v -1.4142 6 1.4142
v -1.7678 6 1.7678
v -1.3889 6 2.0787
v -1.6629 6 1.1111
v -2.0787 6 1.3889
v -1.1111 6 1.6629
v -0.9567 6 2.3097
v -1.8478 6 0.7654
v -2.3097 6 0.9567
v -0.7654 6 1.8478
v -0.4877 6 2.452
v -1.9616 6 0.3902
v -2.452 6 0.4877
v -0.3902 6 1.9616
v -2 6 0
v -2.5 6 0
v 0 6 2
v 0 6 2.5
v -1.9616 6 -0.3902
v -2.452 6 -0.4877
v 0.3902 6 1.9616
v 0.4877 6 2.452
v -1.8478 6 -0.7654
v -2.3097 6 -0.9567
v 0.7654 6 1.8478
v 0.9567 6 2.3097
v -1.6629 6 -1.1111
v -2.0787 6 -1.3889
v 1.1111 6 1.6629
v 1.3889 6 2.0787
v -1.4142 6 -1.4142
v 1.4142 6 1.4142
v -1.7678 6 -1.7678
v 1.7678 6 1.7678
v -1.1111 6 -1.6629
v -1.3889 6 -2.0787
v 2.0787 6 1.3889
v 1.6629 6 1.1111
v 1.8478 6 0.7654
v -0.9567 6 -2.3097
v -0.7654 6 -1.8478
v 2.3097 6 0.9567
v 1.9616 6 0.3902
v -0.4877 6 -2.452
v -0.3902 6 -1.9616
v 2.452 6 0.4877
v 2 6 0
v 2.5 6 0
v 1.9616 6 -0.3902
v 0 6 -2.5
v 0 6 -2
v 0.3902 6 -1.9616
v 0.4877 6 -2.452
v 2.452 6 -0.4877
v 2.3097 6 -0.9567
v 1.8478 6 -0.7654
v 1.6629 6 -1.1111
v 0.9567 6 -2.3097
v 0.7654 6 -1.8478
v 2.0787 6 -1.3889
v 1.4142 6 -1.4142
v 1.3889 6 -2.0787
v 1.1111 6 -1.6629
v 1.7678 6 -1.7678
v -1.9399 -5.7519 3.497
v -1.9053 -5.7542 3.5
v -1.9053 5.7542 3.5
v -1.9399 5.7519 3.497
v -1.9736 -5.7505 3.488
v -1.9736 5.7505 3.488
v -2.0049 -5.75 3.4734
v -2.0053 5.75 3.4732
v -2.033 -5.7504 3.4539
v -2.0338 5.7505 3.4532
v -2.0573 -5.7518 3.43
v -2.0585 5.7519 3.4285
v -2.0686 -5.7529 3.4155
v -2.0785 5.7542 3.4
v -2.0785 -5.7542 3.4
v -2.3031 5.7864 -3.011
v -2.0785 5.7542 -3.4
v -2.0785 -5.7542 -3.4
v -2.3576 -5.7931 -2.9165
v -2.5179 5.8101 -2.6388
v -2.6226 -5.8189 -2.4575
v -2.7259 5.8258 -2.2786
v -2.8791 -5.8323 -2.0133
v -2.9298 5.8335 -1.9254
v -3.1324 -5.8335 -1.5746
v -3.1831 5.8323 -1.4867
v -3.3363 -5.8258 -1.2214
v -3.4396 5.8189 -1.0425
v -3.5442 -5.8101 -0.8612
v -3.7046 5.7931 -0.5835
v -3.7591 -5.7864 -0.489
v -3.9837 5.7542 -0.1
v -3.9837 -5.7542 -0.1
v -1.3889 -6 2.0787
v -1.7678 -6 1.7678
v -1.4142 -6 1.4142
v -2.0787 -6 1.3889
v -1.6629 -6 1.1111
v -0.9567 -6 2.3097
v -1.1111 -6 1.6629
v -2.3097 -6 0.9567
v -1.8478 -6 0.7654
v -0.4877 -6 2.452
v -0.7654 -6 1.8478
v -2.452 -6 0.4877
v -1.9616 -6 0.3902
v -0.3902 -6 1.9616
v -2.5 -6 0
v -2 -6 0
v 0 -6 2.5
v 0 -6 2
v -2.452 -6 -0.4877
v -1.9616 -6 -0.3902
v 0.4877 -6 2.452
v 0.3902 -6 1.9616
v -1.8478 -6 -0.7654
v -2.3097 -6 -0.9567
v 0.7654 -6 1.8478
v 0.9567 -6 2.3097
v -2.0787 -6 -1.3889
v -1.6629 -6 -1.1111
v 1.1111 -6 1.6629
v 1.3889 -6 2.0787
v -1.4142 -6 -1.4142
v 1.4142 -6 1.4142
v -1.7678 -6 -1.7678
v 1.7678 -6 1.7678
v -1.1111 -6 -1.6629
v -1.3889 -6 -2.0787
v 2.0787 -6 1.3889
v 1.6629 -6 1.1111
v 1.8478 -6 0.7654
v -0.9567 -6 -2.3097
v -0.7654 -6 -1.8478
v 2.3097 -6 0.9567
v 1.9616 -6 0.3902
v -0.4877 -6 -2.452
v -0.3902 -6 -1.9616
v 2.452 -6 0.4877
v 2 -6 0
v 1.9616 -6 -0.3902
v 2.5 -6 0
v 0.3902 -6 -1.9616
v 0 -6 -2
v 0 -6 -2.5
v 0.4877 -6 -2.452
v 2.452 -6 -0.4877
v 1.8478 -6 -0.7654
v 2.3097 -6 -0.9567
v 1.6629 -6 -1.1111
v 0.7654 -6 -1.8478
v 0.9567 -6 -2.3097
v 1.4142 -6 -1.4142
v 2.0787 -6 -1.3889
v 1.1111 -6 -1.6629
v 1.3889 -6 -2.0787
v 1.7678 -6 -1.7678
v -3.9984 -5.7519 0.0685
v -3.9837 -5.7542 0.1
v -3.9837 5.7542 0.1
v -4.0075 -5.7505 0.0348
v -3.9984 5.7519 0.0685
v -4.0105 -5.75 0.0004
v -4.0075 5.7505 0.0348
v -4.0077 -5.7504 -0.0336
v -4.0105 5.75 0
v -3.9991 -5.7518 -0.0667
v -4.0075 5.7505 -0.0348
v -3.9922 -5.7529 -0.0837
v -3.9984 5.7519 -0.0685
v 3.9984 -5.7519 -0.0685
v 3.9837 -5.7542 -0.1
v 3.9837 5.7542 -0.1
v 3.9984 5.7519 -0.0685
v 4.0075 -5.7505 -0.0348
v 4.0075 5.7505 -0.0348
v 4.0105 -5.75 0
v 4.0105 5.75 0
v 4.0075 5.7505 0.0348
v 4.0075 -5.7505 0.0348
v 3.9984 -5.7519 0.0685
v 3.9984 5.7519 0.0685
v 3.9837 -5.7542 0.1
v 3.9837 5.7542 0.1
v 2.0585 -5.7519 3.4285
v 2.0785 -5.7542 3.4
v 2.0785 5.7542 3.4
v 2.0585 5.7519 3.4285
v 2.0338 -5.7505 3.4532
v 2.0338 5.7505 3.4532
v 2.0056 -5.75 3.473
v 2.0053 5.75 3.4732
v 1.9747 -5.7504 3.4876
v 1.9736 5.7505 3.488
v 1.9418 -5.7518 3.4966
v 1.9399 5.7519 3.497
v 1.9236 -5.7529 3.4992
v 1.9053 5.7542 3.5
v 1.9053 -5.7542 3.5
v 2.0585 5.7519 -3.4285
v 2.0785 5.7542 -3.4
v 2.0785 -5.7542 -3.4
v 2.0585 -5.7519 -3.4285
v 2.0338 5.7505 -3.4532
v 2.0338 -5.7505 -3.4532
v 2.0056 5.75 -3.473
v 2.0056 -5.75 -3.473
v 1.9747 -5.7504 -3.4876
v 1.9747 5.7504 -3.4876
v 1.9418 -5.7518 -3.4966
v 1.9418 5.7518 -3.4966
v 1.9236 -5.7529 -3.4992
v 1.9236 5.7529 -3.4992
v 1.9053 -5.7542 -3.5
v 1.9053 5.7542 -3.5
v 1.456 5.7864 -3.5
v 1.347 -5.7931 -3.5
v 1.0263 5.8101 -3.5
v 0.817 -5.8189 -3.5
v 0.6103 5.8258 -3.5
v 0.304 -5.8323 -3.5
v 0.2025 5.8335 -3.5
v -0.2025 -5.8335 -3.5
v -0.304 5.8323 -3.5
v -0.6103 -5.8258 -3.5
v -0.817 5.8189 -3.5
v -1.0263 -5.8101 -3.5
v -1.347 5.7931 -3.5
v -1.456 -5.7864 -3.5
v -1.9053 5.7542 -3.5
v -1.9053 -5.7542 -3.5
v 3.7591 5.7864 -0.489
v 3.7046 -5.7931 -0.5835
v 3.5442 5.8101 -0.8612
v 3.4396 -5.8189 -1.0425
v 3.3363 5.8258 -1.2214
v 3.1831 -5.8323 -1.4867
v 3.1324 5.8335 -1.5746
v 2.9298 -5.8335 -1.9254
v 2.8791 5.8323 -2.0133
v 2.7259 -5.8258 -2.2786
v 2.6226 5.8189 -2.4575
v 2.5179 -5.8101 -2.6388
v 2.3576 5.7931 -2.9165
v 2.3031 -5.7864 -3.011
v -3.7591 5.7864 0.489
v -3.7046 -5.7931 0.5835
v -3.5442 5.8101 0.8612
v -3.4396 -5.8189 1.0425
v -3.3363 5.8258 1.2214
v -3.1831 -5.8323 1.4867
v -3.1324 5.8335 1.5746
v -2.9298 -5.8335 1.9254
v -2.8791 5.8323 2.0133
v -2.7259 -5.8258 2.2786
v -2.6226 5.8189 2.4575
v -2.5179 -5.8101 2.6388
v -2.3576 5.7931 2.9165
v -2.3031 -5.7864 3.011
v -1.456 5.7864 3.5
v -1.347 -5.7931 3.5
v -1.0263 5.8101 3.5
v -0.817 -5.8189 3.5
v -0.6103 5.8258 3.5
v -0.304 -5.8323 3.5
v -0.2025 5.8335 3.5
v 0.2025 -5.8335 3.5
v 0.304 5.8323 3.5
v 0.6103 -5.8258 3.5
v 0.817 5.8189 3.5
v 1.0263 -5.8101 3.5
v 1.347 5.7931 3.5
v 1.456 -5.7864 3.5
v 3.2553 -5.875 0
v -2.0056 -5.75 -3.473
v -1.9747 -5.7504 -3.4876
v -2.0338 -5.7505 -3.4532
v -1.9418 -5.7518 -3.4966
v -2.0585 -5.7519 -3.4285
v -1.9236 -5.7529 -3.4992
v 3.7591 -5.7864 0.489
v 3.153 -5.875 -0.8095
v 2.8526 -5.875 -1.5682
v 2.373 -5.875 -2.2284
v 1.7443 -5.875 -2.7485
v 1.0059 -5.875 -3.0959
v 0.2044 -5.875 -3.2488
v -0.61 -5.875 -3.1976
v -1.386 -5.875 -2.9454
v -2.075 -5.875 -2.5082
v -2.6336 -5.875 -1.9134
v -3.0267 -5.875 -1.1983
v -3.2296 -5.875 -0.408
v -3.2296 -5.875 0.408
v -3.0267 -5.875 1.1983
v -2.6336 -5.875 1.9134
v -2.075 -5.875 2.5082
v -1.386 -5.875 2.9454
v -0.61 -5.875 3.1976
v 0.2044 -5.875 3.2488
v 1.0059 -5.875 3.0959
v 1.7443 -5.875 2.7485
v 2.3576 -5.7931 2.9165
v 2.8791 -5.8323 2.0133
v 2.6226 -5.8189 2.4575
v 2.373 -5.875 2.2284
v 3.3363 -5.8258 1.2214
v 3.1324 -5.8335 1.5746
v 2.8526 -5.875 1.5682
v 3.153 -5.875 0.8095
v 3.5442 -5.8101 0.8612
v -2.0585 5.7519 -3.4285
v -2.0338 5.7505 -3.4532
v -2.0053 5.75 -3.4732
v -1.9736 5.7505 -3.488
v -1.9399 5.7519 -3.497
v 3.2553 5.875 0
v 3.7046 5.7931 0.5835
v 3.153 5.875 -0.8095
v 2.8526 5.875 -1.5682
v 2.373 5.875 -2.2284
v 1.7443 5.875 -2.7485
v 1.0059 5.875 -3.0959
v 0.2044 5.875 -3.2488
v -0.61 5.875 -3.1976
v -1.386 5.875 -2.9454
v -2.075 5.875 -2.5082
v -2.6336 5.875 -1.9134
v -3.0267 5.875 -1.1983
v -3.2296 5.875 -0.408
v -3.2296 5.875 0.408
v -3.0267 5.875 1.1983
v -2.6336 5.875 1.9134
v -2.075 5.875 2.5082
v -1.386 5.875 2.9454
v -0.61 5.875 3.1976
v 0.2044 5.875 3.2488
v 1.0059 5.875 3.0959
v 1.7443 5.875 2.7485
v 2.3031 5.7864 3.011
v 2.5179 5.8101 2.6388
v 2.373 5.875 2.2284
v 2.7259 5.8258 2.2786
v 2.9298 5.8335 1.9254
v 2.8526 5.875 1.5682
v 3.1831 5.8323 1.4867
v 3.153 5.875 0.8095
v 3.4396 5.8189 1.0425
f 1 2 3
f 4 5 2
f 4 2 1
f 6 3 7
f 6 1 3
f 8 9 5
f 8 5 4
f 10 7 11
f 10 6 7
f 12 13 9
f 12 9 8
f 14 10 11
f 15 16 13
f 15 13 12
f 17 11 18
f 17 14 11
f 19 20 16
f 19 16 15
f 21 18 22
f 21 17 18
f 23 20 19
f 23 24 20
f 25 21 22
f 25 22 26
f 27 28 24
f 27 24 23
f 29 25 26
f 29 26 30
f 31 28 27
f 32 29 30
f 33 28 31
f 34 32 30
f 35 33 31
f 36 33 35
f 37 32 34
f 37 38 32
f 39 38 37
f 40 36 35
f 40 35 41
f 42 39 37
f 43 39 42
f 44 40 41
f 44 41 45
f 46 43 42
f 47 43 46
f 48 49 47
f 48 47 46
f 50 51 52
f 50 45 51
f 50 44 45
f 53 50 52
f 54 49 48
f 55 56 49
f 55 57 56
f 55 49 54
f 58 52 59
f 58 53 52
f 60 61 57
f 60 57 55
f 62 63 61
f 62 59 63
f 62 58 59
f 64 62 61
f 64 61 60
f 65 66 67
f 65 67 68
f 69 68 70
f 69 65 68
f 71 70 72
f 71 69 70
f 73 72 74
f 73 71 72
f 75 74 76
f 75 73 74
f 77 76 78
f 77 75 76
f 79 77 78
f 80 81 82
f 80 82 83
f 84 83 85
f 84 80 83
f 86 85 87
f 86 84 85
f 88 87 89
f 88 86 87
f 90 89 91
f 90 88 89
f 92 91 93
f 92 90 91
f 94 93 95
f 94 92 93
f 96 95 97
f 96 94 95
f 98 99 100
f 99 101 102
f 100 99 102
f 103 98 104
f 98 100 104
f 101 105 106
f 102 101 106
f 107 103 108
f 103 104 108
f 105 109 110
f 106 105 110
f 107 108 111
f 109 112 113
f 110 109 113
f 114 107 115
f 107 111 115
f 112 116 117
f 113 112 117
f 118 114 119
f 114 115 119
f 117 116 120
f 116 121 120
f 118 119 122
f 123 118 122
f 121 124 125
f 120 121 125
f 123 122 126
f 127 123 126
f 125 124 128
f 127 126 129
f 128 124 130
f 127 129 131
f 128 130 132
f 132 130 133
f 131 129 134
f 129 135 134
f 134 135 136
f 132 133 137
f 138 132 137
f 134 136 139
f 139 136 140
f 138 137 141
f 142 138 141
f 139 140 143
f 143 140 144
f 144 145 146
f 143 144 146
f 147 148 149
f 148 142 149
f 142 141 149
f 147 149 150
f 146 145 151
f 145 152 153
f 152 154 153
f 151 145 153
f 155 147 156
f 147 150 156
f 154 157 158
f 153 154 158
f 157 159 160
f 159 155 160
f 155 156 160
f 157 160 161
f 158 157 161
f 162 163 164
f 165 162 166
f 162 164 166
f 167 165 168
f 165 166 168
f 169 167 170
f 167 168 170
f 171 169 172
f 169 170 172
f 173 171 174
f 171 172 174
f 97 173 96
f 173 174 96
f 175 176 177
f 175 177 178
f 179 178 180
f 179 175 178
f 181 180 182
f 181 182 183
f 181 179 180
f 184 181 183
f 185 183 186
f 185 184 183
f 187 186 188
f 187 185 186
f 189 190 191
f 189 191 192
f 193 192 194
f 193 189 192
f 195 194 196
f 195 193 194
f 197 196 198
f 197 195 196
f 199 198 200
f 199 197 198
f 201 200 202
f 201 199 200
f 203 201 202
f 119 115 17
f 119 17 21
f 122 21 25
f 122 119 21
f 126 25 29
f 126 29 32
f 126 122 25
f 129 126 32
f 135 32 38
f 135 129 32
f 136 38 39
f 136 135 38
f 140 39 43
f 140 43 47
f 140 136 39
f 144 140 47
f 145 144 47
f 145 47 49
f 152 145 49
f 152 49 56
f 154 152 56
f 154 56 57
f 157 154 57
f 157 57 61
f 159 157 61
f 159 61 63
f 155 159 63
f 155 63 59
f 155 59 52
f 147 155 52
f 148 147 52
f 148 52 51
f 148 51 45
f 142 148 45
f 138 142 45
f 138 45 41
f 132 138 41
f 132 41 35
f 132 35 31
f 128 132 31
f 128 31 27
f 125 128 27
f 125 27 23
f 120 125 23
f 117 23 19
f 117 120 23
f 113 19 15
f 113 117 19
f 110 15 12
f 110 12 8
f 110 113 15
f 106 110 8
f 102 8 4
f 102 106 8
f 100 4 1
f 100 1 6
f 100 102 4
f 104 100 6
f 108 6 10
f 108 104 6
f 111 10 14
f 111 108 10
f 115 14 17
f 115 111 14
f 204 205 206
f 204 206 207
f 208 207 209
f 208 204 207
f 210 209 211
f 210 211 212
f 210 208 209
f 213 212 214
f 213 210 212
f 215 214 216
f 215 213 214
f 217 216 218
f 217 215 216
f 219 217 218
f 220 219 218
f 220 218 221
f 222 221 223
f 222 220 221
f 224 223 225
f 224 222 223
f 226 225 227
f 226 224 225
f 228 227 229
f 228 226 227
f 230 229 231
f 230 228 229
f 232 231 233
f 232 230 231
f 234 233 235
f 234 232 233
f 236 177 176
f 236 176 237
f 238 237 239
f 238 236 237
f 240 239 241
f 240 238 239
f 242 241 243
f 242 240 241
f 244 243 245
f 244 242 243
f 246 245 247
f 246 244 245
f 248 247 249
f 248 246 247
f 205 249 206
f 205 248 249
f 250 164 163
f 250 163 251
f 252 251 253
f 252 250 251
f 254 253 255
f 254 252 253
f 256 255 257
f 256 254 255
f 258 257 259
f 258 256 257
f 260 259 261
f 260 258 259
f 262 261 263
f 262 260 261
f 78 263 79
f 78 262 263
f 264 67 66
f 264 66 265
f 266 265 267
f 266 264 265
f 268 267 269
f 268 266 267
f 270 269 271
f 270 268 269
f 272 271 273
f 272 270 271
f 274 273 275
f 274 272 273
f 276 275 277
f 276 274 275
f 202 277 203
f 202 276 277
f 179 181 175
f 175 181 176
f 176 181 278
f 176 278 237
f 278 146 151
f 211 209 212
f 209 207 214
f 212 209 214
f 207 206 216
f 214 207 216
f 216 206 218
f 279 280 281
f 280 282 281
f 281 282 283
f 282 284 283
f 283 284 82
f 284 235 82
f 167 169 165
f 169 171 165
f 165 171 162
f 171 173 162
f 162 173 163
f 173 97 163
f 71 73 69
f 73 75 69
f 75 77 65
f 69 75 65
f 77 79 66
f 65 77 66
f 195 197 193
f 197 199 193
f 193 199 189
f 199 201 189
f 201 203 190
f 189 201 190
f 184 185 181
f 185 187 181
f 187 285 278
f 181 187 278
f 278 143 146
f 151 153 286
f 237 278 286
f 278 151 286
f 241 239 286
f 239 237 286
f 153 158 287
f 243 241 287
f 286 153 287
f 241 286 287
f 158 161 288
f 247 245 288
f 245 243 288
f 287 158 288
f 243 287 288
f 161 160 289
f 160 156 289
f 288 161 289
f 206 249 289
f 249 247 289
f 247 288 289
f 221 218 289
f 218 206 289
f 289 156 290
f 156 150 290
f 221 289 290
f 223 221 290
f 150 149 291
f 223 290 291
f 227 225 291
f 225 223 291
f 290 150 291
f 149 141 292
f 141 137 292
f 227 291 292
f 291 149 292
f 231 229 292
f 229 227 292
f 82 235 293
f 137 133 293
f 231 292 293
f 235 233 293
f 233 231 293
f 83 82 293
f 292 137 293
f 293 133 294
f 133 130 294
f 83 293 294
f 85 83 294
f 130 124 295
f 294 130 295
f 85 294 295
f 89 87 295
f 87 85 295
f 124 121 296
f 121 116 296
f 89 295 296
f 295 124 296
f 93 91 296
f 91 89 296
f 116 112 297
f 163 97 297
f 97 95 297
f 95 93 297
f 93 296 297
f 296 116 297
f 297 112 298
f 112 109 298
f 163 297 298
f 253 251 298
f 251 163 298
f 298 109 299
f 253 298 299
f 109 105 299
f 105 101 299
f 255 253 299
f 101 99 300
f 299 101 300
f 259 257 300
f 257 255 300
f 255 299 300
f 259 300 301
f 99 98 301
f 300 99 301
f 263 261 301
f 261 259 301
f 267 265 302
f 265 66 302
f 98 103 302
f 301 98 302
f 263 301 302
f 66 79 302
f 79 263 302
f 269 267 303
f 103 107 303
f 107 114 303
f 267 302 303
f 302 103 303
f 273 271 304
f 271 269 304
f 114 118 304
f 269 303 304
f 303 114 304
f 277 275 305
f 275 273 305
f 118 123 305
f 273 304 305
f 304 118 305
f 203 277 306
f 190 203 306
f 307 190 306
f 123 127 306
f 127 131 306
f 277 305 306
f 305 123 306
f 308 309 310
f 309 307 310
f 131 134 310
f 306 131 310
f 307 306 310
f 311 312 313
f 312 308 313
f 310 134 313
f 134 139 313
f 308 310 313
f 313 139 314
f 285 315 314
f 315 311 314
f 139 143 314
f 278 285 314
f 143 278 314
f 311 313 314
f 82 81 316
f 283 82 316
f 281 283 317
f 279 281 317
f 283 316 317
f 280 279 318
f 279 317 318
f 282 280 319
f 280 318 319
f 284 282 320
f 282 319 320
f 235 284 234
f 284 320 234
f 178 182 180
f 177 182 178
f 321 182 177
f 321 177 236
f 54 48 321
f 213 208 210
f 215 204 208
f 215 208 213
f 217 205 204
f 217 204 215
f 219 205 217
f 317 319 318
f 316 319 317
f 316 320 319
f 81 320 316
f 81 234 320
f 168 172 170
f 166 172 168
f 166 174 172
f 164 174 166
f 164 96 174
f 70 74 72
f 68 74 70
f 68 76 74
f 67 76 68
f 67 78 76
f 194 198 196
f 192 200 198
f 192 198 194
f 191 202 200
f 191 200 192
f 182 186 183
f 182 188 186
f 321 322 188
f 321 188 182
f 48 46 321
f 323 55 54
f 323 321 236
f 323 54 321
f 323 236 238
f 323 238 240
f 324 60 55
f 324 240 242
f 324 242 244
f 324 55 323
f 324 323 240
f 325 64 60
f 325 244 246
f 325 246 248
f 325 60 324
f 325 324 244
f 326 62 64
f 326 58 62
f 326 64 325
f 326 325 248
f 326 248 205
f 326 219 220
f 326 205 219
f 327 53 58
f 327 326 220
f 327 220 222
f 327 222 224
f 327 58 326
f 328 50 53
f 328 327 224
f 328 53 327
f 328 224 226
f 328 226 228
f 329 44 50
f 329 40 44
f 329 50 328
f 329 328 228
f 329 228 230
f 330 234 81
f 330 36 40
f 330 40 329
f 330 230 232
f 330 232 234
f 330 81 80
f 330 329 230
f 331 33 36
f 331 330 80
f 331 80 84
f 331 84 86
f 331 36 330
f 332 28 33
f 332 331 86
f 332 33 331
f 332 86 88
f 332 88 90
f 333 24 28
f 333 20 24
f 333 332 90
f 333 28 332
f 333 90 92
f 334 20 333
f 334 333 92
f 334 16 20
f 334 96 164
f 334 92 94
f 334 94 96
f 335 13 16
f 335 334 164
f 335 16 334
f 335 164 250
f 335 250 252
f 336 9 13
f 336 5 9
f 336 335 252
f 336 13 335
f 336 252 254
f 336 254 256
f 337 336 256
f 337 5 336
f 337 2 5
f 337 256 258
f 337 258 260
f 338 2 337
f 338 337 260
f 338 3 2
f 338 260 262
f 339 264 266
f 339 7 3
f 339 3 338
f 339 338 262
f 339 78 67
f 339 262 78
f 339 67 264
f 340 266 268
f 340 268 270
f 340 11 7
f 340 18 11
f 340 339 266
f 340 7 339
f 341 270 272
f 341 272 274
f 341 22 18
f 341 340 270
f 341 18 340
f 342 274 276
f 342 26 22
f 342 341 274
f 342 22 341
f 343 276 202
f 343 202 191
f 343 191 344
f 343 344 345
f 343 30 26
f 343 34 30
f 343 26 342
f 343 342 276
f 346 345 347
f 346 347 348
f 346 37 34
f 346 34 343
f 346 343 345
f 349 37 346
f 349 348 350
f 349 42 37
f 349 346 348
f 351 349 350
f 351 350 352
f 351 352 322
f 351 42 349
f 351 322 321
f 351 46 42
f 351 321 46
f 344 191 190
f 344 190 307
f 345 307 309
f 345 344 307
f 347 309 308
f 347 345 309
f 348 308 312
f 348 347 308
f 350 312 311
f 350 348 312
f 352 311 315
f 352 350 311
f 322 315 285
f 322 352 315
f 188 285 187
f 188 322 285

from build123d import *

# Parameters (mm, degrees)
EXTRUDE_1_DEPTH     = 6
FILLET_1_R          = 0.2
SKETCH_3_R          = 2
CUT_EXTRUDE_1_DEPTH = 8


with BuildPart() as part:
    # 草图1 → 凸台-拉伸1 (new, symmetric)
    with BuildSketch(Plane(origin=(0, 0, 0), x_dir=(1, 0, 0), z_dir=(0, 1, 0))):
        Polygon((4.041451884, 0), (2.020725942, 3.5), (-2.020725942, 3.5), (-4.041451884, 0), (-2.020725942, -3.5), (2.020725942, -3.5), align=None)
    extrude(amount=EXTRUDE_1_DEPTH, both=True)

    # 圆角1
    fillet_1_edges = [part.edges().sort_by_distance(p)[0] for p in [
        (2.020725942, 0, 3.5),
        (-2.020725942, 0, 3.5),
        (-4.041451884, 0, 0),
        (-2.020725942, 0, -3.5),
        (2.020725942, 0, -3.5),
        (4.041451884, 0, 0),
    ]]
    fillet(fillet_1_edges, radius=FILLET_1_R)

    # 草图3 → 切除-拉伸1 (cut)
    with BuildSketch(Plane(origin=(0, 6, 0), x_dir=(1, 0, 0), z_dir=(0, 1, 0))):
        with Locations(Location((0, 0, 0), (0, 0, 270))):
            Circle(SKETCH_3_R)
    cut_extrude_1 = extrude(amount=-CUT_EXTRUDE_1_DEPTH, mode=Mode.SUBTRACT)

    # 草图4 → 切除-旋转1 (revolve, cut)
    with BuildSketch(Plane.XY, mode=Mode.PRIVATE) as cut_revolve_1_sk:
        Polygon((-4.010511777, 6), (-4.010511777, 5.75), (-2.5, 6), align=None)
    cut_revolve_1 = revolve(cut_revolve_1_sk.sketch.rotate(Axis((0, 0, 0), (0, 1, 0)), 180), axis=Axis((0, 0, 0), (0, 1, 0)), mode=Mode.SUBTRACT)

    # 镜向1: 切除-拉伸1, 切除-旋转1 across plane
    add(cut_extrude_1.mirror(Plane.ZX), mode=Mode.SUBTRACT)
    add(cut_revolve_1.mirror(Plane.ZX), mode=Mode.SUBTRACT)


solid = part.part
